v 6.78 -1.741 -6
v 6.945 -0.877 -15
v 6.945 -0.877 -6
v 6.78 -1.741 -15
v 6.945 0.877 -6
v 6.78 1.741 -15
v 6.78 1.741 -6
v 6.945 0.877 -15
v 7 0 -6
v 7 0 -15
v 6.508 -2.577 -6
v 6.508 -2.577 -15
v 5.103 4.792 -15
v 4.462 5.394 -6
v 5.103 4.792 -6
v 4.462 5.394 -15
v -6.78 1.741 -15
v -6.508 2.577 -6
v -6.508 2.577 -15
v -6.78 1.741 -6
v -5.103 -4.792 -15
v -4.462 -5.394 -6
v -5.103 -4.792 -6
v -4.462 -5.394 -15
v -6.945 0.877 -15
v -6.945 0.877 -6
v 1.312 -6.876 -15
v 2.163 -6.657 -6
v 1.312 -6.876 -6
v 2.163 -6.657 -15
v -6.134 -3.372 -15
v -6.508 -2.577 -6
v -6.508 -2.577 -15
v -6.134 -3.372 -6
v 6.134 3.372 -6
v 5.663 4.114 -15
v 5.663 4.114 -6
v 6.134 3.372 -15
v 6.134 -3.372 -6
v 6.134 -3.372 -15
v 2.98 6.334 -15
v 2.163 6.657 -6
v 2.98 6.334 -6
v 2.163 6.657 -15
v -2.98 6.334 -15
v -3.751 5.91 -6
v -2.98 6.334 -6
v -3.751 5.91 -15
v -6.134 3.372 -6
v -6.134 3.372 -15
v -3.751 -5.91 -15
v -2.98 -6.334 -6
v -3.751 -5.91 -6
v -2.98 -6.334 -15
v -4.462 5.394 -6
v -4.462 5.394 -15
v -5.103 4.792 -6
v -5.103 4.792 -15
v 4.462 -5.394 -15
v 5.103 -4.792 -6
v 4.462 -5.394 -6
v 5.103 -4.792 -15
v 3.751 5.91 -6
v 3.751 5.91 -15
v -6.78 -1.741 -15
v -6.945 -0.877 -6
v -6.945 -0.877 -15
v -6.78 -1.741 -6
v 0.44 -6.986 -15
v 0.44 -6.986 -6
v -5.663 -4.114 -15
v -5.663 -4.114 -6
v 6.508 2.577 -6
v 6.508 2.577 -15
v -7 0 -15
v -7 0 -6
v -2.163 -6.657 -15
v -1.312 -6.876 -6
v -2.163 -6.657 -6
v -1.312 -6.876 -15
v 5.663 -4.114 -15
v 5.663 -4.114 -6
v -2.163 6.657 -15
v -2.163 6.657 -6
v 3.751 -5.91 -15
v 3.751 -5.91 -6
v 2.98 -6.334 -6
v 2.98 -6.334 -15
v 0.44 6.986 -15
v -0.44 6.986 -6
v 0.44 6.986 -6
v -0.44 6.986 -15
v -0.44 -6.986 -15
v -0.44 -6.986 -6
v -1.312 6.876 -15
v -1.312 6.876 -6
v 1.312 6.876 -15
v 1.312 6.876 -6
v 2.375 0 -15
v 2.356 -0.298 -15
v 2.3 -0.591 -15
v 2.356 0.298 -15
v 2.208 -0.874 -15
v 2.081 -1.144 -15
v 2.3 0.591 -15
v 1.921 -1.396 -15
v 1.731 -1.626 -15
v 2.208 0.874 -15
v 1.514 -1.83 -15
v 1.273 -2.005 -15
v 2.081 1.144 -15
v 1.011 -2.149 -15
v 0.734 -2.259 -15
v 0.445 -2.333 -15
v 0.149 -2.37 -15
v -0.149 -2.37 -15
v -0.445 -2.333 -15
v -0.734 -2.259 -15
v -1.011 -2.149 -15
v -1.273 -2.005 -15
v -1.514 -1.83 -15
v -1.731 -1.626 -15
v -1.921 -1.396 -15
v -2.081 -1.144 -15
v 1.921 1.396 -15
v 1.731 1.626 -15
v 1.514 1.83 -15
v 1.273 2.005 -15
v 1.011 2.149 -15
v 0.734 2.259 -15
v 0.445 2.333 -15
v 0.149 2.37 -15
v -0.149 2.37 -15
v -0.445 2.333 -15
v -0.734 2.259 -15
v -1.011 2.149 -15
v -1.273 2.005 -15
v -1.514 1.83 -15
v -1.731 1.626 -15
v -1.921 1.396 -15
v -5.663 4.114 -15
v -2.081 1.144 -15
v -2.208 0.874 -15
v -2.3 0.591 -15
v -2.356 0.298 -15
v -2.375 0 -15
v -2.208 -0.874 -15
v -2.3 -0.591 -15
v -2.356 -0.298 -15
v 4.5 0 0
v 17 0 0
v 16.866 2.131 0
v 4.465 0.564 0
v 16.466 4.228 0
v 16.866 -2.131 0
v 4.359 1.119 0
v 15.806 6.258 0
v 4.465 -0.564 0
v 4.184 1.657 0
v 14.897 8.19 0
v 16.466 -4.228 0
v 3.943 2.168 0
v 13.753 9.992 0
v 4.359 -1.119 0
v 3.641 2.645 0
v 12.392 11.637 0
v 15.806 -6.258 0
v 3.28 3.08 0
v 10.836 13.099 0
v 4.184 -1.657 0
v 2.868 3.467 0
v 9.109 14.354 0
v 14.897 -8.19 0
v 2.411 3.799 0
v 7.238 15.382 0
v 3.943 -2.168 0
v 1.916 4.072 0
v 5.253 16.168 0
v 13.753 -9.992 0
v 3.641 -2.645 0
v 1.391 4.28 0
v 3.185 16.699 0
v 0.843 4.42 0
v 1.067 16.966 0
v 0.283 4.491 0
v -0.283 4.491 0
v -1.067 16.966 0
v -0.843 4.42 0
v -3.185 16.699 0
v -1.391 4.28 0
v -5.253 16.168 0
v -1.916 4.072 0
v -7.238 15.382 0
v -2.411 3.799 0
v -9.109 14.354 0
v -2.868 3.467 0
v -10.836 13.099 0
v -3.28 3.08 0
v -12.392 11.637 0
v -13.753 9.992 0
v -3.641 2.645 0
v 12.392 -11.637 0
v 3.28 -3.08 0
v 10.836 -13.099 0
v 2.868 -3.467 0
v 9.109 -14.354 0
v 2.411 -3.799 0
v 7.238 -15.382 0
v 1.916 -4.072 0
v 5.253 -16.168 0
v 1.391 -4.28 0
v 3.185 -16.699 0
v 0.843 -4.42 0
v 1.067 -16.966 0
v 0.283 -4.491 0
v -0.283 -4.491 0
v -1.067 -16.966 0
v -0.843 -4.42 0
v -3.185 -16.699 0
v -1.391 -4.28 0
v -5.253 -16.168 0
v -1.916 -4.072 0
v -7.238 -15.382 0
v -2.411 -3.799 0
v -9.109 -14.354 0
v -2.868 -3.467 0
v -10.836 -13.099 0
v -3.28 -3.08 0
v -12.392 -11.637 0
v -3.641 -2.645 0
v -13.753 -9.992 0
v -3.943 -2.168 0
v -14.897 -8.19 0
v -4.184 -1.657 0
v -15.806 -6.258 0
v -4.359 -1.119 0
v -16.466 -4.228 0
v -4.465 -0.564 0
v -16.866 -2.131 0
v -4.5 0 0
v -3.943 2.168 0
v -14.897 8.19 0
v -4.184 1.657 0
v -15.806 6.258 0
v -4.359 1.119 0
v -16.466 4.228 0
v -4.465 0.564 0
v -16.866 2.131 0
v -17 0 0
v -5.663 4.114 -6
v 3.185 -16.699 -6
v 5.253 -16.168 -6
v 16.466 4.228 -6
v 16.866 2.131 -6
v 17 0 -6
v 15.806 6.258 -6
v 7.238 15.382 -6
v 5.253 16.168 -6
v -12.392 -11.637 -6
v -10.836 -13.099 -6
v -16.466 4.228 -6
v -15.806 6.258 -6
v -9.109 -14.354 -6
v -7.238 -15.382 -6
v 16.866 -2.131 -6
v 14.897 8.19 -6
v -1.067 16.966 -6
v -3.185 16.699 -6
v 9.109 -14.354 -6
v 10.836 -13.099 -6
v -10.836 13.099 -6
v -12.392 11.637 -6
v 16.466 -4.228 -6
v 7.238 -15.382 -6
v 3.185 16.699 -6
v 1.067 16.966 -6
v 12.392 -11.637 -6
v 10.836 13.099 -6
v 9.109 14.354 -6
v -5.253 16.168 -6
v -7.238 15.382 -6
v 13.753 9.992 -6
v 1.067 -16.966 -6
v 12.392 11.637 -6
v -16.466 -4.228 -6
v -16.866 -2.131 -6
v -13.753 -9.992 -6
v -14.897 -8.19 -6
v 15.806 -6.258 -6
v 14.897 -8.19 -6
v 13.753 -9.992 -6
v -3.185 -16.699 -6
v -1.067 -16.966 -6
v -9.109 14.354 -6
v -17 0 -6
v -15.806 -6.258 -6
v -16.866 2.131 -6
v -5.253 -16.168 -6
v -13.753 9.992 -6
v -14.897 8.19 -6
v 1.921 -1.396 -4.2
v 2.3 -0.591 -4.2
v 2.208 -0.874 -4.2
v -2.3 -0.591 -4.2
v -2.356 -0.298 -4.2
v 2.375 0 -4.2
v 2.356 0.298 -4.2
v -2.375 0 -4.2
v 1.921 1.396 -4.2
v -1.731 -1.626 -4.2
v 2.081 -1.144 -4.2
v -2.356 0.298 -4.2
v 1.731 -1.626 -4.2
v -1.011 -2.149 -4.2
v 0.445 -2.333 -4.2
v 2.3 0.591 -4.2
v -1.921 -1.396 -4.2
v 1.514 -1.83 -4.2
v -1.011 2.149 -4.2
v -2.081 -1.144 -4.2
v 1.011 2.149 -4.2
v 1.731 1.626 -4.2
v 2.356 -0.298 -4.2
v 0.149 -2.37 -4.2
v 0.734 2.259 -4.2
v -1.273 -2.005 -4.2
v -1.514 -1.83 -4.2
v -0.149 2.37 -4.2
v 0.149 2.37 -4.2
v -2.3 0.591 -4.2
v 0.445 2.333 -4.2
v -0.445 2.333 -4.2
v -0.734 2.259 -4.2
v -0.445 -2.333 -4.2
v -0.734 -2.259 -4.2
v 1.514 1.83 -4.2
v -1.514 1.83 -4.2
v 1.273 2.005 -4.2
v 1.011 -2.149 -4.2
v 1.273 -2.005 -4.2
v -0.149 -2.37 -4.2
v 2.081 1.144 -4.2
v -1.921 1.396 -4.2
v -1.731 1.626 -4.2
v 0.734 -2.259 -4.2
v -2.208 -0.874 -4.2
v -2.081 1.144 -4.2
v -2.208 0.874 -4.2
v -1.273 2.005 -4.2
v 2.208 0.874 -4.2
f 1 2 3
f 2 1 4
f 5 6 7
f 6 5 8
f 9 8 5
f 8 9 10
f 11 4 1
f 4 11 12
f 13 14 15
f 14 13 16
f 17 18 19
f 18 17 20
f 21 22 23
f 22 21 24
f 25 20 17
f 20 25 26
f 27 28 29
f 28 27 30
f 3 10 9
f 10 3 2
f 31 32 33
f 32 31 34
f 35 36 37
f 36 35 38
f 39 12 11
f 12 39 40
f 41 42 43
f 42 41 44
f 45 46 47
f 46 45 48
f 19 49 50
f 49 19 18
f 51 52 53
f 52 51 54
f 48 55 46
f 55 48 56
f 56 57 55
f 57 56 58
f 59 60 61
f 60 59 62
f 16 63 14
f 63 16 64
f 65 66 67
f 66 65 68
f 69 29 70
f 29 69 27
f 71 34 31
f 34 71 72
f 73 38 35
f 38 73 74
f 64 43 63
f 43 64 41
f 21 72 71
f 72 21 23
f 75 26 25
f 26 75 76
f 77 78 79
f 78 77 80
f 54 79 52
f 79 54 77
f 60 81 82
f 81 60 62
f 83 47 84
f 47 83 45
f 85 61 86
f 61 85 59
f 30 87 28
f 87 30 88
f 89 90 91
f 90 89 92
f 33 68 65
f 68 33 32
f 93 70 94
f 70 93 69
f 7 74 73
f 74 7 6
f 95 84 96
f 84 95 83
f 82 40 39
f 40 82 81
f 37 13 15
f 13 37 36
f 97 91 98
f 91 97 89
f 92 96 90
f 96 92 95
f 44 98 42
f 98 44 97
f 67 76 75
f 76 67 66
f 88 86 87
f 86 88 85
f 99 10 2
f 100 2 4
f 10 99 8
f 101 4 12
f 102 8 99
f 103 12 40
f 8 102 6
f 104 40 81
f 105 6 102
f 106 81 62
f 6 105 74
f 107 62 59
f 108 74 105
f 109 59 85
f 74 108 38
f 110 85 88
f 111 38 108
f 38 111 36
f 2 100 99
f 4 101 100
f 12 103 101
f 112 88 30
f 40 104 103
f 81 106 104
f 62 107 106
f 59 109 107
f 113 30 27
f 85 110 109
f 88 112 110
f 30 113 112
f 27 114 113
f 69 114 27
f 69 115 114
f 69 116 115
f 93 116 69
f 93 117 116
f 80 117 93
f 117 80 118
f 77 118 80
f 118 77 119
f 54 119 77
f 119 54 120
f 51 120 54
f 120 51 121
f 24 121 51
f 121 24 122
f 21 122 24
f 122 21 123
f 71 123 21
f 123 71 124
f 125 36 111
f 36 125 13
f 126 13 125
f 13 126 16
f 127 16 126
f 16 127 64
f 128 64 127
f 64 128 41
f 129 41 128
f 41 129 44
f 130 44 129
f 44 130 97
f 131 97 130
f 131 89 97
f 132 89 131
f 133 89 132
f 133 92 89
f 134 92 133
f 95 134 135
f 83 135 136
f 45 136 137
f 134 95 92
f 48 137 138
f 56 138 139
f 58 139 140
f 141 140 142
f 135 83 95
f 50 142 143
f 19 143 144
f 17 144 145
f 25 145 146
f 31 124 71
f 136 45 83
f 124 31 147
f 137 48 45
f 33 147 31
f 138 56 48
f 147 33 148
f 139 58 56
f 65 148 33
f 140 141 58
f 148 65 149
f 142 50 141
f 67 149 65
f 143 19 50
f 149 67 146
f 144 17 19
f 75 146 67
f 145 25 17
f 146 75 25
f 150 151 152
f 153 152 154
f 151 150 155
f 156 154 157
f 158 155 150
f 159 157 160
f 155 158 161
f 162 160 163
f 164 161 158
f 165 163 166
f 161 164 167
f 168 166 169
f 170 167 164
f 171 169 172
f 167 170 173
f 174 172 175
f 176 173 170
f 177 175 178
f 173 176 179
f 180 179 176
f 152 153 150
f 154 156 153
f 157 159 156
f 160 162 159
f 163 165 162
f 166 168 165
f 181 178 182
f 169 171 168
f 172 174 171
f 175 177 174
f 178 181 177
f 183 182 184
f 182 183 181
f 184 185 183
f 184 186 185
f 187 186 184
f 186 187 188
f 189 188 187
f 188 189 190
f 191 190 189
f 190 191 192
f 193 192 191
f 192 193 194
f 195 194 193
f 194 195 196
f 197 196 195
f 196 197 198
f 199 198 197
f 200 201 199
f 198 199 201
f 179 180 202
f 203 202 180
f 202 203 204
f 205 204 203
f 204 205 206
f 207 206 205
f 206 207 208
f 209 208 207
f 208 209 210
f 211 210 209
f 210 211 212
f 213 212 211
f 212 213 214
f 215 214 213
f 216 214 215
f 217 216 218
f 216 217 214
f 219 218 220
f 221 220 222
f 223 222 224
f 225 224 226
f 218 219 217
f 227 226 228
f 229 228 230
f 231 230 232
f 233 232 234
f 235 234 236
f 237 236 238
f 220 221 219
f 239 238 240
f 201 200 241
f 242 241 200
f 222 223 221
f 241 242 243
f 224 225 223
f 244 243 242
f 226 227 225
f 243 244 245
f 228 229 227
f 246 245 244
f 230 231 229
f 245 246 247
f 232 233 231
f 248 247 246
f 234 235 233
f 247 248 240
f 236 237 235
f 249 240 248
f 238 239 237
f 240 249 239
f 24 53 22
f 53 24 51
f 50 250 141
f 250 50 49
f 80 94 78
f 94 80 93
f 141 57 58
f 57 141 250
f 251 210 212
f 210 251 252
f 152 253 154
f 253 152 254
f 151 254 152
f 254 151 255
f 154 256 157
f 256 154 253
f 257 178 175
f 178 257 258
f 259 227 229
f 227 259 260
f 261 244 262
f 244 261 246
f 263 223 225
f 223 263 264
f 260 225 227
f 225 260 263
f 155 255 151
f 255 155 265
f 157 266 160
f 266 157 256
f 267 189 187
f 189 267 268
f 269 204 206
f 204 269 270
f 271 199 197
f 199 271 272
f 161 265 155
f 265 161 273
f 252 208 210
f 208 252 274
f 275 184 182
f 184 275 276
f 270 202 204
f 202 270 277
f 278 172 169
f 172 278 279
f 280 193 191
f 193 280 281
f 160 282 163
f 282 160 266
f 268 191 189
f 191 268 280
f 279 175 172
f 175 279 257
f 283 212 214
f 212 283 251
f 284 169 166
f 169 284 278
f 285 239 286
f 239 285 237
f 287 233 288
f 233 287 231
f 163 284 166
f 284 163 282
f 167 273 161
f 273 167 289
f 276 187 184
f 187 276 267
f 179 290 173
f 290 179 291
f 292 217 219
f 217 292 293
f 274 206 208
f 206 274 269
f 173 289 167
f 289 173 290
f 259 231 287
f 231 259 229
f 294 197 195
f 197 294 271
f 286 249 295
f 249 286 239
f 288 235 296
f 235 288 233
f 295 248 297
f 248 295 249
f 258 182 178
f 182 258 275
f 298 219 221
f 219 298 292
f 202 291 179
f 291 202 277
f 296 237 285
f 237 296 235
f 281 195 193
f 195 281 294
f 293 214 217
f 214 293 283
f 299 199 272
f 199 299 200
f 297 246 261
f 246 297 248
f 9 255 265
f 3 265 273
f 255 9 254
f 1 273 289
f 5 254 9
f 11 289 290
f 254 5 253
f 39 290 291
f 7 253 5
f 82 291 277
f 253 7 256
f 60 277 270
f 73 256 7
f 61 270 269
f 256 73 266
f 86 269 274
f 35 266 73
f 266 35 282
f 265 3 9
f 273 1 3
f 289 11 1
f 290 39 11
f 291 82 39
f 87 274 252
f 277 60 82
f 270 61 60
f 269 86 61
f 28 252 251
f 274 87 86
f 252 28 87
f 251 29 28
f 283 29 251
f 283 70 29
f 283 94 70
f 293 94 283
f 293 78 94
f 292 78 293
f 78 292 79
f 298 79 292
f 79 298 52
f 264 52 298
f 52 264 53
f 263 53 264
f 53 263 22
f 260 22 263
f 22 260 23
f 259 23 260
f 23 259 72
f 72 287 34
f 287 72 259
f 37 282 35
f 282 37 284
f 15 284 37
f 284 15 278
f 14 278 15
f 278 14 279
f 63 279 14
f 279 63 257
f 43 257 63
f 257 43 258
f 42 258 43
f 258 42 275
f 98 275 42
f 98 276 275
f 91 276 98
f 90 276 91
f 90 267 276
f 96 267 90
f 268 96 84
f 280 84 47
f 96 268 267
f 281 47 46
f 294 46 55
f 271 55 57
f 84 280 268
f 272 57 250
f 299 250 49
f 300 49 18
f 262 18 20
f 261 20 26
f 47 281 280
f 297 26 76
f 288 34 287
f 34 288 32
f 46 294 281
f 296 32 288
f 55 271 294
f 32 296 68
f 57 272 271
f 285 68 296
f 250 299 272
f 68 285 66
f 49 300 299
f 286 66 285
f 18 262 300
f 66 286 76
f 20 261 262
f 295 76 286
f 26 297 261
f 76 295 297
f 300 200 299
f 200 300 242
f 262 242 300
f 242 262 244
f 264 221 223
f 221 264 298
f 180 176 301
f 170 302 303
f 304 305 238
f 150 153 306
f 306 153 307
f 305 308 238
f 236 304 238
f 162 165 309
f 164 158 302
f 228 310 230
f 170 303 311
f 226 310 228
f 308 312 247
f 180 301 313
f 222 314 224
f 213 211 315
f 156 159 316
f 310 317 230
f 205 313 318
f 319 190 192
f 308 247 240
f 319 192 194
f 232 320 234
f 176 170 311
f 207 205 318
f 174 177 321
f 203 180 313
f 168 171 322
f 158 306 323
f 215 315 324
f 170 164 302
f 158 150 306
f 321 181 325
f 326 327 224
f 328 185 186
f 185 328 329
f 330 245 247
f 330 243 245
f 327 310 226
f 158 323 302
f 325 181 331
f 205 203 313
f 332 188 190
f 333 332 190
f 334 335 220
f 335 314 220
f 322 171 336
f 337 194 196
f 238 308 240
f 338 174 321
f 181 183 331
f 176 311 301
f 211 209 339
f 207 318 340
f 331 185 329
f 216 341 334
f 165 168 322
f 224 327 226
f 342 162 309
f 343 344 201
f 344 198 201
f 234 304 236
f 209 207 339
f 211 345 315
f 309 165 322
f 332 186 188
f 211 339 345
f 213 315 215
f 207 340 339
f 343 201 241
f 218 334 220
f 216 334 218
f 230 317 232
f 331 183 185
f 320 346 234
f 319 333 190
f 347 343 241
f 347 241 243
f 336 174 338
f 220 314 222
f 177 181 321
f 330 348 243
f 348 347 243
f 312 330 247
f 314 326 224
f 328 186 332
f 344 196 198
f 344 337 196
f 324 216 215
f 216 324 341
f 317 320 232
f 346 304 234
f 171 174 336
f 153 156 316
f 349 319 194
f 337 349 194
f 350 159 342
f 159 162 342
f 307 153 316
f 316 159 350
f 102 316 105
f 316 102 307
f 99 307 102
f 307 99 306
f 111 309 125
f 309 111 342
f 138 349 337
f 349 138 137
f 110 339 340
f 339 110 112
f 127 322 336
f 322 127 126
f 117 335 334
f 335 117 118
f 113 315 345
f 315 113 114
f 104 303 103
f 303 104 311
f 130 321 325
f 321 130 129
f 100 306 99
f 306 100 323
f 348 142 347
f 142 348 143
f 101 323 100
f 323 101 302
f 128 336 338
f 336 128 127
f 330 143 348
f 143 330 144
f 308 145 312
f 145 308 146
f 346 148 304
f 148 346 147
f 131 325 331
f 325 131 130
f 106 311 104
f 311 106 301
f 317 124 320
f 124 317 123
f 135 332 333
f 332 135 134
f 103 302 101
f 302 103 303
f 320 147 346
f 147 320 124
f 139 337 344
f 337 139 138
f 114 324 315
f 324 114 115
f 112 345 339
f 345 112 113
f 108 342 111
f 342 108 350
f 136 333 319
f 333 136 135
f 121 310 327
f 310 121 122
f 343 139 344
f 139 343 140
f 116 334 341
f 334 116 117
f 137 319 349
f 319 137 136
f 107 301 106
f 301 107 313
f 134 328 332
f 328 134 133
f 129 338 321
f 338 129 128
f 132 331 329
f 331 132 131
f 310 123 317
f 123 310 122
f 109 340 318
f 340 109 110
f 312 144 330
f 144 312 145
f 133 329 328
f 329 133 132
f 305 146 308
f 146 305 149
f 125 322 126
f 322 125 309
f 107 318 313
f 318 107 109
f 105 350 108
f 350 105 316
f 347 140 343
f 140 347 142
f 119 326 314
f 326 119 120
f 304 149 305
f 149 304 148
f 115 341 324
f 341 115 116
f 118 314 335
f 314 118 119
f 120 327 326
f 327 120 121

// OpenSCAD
$fn = 50;


difference() {
	union() {
		translate(v = [0, 0, -15.0000000000]) {
			cylinder(h = 15, r = 7.0000000000);
		}
		translate(v = [0, 0, -6.0000000000]) {
			cylinder(h = 6, r = 17.0000000000);
		}
	}
	union() {
		translate(v = [0, 0, 0]) {
			rotate(a = [0, 0, 0]) {
				difference() {
					union() {
						#translate(v = [0, 0, -15.0000000000]) {
							cylinder(h = 15, r = 2.2500000000);
						}
						#translate(v = [0, 0, -4.2000000000]) {
							cylinder(h = 4.2000000000, r = 7.0000000000, r1 = 2.3750000000, r2 = 4.5000000000);
						}
						#translate(v = [0, 0, -15.0000000000]) {
							cylinder(h = 15, r = 2.3750000000);
						}
						#translate(v = [0, 0, -15.0000000000]) {
							cylinder(h = 15, r = 2.2500000000);
						}
					}
					union();
				}
			}
		}
	}
}
